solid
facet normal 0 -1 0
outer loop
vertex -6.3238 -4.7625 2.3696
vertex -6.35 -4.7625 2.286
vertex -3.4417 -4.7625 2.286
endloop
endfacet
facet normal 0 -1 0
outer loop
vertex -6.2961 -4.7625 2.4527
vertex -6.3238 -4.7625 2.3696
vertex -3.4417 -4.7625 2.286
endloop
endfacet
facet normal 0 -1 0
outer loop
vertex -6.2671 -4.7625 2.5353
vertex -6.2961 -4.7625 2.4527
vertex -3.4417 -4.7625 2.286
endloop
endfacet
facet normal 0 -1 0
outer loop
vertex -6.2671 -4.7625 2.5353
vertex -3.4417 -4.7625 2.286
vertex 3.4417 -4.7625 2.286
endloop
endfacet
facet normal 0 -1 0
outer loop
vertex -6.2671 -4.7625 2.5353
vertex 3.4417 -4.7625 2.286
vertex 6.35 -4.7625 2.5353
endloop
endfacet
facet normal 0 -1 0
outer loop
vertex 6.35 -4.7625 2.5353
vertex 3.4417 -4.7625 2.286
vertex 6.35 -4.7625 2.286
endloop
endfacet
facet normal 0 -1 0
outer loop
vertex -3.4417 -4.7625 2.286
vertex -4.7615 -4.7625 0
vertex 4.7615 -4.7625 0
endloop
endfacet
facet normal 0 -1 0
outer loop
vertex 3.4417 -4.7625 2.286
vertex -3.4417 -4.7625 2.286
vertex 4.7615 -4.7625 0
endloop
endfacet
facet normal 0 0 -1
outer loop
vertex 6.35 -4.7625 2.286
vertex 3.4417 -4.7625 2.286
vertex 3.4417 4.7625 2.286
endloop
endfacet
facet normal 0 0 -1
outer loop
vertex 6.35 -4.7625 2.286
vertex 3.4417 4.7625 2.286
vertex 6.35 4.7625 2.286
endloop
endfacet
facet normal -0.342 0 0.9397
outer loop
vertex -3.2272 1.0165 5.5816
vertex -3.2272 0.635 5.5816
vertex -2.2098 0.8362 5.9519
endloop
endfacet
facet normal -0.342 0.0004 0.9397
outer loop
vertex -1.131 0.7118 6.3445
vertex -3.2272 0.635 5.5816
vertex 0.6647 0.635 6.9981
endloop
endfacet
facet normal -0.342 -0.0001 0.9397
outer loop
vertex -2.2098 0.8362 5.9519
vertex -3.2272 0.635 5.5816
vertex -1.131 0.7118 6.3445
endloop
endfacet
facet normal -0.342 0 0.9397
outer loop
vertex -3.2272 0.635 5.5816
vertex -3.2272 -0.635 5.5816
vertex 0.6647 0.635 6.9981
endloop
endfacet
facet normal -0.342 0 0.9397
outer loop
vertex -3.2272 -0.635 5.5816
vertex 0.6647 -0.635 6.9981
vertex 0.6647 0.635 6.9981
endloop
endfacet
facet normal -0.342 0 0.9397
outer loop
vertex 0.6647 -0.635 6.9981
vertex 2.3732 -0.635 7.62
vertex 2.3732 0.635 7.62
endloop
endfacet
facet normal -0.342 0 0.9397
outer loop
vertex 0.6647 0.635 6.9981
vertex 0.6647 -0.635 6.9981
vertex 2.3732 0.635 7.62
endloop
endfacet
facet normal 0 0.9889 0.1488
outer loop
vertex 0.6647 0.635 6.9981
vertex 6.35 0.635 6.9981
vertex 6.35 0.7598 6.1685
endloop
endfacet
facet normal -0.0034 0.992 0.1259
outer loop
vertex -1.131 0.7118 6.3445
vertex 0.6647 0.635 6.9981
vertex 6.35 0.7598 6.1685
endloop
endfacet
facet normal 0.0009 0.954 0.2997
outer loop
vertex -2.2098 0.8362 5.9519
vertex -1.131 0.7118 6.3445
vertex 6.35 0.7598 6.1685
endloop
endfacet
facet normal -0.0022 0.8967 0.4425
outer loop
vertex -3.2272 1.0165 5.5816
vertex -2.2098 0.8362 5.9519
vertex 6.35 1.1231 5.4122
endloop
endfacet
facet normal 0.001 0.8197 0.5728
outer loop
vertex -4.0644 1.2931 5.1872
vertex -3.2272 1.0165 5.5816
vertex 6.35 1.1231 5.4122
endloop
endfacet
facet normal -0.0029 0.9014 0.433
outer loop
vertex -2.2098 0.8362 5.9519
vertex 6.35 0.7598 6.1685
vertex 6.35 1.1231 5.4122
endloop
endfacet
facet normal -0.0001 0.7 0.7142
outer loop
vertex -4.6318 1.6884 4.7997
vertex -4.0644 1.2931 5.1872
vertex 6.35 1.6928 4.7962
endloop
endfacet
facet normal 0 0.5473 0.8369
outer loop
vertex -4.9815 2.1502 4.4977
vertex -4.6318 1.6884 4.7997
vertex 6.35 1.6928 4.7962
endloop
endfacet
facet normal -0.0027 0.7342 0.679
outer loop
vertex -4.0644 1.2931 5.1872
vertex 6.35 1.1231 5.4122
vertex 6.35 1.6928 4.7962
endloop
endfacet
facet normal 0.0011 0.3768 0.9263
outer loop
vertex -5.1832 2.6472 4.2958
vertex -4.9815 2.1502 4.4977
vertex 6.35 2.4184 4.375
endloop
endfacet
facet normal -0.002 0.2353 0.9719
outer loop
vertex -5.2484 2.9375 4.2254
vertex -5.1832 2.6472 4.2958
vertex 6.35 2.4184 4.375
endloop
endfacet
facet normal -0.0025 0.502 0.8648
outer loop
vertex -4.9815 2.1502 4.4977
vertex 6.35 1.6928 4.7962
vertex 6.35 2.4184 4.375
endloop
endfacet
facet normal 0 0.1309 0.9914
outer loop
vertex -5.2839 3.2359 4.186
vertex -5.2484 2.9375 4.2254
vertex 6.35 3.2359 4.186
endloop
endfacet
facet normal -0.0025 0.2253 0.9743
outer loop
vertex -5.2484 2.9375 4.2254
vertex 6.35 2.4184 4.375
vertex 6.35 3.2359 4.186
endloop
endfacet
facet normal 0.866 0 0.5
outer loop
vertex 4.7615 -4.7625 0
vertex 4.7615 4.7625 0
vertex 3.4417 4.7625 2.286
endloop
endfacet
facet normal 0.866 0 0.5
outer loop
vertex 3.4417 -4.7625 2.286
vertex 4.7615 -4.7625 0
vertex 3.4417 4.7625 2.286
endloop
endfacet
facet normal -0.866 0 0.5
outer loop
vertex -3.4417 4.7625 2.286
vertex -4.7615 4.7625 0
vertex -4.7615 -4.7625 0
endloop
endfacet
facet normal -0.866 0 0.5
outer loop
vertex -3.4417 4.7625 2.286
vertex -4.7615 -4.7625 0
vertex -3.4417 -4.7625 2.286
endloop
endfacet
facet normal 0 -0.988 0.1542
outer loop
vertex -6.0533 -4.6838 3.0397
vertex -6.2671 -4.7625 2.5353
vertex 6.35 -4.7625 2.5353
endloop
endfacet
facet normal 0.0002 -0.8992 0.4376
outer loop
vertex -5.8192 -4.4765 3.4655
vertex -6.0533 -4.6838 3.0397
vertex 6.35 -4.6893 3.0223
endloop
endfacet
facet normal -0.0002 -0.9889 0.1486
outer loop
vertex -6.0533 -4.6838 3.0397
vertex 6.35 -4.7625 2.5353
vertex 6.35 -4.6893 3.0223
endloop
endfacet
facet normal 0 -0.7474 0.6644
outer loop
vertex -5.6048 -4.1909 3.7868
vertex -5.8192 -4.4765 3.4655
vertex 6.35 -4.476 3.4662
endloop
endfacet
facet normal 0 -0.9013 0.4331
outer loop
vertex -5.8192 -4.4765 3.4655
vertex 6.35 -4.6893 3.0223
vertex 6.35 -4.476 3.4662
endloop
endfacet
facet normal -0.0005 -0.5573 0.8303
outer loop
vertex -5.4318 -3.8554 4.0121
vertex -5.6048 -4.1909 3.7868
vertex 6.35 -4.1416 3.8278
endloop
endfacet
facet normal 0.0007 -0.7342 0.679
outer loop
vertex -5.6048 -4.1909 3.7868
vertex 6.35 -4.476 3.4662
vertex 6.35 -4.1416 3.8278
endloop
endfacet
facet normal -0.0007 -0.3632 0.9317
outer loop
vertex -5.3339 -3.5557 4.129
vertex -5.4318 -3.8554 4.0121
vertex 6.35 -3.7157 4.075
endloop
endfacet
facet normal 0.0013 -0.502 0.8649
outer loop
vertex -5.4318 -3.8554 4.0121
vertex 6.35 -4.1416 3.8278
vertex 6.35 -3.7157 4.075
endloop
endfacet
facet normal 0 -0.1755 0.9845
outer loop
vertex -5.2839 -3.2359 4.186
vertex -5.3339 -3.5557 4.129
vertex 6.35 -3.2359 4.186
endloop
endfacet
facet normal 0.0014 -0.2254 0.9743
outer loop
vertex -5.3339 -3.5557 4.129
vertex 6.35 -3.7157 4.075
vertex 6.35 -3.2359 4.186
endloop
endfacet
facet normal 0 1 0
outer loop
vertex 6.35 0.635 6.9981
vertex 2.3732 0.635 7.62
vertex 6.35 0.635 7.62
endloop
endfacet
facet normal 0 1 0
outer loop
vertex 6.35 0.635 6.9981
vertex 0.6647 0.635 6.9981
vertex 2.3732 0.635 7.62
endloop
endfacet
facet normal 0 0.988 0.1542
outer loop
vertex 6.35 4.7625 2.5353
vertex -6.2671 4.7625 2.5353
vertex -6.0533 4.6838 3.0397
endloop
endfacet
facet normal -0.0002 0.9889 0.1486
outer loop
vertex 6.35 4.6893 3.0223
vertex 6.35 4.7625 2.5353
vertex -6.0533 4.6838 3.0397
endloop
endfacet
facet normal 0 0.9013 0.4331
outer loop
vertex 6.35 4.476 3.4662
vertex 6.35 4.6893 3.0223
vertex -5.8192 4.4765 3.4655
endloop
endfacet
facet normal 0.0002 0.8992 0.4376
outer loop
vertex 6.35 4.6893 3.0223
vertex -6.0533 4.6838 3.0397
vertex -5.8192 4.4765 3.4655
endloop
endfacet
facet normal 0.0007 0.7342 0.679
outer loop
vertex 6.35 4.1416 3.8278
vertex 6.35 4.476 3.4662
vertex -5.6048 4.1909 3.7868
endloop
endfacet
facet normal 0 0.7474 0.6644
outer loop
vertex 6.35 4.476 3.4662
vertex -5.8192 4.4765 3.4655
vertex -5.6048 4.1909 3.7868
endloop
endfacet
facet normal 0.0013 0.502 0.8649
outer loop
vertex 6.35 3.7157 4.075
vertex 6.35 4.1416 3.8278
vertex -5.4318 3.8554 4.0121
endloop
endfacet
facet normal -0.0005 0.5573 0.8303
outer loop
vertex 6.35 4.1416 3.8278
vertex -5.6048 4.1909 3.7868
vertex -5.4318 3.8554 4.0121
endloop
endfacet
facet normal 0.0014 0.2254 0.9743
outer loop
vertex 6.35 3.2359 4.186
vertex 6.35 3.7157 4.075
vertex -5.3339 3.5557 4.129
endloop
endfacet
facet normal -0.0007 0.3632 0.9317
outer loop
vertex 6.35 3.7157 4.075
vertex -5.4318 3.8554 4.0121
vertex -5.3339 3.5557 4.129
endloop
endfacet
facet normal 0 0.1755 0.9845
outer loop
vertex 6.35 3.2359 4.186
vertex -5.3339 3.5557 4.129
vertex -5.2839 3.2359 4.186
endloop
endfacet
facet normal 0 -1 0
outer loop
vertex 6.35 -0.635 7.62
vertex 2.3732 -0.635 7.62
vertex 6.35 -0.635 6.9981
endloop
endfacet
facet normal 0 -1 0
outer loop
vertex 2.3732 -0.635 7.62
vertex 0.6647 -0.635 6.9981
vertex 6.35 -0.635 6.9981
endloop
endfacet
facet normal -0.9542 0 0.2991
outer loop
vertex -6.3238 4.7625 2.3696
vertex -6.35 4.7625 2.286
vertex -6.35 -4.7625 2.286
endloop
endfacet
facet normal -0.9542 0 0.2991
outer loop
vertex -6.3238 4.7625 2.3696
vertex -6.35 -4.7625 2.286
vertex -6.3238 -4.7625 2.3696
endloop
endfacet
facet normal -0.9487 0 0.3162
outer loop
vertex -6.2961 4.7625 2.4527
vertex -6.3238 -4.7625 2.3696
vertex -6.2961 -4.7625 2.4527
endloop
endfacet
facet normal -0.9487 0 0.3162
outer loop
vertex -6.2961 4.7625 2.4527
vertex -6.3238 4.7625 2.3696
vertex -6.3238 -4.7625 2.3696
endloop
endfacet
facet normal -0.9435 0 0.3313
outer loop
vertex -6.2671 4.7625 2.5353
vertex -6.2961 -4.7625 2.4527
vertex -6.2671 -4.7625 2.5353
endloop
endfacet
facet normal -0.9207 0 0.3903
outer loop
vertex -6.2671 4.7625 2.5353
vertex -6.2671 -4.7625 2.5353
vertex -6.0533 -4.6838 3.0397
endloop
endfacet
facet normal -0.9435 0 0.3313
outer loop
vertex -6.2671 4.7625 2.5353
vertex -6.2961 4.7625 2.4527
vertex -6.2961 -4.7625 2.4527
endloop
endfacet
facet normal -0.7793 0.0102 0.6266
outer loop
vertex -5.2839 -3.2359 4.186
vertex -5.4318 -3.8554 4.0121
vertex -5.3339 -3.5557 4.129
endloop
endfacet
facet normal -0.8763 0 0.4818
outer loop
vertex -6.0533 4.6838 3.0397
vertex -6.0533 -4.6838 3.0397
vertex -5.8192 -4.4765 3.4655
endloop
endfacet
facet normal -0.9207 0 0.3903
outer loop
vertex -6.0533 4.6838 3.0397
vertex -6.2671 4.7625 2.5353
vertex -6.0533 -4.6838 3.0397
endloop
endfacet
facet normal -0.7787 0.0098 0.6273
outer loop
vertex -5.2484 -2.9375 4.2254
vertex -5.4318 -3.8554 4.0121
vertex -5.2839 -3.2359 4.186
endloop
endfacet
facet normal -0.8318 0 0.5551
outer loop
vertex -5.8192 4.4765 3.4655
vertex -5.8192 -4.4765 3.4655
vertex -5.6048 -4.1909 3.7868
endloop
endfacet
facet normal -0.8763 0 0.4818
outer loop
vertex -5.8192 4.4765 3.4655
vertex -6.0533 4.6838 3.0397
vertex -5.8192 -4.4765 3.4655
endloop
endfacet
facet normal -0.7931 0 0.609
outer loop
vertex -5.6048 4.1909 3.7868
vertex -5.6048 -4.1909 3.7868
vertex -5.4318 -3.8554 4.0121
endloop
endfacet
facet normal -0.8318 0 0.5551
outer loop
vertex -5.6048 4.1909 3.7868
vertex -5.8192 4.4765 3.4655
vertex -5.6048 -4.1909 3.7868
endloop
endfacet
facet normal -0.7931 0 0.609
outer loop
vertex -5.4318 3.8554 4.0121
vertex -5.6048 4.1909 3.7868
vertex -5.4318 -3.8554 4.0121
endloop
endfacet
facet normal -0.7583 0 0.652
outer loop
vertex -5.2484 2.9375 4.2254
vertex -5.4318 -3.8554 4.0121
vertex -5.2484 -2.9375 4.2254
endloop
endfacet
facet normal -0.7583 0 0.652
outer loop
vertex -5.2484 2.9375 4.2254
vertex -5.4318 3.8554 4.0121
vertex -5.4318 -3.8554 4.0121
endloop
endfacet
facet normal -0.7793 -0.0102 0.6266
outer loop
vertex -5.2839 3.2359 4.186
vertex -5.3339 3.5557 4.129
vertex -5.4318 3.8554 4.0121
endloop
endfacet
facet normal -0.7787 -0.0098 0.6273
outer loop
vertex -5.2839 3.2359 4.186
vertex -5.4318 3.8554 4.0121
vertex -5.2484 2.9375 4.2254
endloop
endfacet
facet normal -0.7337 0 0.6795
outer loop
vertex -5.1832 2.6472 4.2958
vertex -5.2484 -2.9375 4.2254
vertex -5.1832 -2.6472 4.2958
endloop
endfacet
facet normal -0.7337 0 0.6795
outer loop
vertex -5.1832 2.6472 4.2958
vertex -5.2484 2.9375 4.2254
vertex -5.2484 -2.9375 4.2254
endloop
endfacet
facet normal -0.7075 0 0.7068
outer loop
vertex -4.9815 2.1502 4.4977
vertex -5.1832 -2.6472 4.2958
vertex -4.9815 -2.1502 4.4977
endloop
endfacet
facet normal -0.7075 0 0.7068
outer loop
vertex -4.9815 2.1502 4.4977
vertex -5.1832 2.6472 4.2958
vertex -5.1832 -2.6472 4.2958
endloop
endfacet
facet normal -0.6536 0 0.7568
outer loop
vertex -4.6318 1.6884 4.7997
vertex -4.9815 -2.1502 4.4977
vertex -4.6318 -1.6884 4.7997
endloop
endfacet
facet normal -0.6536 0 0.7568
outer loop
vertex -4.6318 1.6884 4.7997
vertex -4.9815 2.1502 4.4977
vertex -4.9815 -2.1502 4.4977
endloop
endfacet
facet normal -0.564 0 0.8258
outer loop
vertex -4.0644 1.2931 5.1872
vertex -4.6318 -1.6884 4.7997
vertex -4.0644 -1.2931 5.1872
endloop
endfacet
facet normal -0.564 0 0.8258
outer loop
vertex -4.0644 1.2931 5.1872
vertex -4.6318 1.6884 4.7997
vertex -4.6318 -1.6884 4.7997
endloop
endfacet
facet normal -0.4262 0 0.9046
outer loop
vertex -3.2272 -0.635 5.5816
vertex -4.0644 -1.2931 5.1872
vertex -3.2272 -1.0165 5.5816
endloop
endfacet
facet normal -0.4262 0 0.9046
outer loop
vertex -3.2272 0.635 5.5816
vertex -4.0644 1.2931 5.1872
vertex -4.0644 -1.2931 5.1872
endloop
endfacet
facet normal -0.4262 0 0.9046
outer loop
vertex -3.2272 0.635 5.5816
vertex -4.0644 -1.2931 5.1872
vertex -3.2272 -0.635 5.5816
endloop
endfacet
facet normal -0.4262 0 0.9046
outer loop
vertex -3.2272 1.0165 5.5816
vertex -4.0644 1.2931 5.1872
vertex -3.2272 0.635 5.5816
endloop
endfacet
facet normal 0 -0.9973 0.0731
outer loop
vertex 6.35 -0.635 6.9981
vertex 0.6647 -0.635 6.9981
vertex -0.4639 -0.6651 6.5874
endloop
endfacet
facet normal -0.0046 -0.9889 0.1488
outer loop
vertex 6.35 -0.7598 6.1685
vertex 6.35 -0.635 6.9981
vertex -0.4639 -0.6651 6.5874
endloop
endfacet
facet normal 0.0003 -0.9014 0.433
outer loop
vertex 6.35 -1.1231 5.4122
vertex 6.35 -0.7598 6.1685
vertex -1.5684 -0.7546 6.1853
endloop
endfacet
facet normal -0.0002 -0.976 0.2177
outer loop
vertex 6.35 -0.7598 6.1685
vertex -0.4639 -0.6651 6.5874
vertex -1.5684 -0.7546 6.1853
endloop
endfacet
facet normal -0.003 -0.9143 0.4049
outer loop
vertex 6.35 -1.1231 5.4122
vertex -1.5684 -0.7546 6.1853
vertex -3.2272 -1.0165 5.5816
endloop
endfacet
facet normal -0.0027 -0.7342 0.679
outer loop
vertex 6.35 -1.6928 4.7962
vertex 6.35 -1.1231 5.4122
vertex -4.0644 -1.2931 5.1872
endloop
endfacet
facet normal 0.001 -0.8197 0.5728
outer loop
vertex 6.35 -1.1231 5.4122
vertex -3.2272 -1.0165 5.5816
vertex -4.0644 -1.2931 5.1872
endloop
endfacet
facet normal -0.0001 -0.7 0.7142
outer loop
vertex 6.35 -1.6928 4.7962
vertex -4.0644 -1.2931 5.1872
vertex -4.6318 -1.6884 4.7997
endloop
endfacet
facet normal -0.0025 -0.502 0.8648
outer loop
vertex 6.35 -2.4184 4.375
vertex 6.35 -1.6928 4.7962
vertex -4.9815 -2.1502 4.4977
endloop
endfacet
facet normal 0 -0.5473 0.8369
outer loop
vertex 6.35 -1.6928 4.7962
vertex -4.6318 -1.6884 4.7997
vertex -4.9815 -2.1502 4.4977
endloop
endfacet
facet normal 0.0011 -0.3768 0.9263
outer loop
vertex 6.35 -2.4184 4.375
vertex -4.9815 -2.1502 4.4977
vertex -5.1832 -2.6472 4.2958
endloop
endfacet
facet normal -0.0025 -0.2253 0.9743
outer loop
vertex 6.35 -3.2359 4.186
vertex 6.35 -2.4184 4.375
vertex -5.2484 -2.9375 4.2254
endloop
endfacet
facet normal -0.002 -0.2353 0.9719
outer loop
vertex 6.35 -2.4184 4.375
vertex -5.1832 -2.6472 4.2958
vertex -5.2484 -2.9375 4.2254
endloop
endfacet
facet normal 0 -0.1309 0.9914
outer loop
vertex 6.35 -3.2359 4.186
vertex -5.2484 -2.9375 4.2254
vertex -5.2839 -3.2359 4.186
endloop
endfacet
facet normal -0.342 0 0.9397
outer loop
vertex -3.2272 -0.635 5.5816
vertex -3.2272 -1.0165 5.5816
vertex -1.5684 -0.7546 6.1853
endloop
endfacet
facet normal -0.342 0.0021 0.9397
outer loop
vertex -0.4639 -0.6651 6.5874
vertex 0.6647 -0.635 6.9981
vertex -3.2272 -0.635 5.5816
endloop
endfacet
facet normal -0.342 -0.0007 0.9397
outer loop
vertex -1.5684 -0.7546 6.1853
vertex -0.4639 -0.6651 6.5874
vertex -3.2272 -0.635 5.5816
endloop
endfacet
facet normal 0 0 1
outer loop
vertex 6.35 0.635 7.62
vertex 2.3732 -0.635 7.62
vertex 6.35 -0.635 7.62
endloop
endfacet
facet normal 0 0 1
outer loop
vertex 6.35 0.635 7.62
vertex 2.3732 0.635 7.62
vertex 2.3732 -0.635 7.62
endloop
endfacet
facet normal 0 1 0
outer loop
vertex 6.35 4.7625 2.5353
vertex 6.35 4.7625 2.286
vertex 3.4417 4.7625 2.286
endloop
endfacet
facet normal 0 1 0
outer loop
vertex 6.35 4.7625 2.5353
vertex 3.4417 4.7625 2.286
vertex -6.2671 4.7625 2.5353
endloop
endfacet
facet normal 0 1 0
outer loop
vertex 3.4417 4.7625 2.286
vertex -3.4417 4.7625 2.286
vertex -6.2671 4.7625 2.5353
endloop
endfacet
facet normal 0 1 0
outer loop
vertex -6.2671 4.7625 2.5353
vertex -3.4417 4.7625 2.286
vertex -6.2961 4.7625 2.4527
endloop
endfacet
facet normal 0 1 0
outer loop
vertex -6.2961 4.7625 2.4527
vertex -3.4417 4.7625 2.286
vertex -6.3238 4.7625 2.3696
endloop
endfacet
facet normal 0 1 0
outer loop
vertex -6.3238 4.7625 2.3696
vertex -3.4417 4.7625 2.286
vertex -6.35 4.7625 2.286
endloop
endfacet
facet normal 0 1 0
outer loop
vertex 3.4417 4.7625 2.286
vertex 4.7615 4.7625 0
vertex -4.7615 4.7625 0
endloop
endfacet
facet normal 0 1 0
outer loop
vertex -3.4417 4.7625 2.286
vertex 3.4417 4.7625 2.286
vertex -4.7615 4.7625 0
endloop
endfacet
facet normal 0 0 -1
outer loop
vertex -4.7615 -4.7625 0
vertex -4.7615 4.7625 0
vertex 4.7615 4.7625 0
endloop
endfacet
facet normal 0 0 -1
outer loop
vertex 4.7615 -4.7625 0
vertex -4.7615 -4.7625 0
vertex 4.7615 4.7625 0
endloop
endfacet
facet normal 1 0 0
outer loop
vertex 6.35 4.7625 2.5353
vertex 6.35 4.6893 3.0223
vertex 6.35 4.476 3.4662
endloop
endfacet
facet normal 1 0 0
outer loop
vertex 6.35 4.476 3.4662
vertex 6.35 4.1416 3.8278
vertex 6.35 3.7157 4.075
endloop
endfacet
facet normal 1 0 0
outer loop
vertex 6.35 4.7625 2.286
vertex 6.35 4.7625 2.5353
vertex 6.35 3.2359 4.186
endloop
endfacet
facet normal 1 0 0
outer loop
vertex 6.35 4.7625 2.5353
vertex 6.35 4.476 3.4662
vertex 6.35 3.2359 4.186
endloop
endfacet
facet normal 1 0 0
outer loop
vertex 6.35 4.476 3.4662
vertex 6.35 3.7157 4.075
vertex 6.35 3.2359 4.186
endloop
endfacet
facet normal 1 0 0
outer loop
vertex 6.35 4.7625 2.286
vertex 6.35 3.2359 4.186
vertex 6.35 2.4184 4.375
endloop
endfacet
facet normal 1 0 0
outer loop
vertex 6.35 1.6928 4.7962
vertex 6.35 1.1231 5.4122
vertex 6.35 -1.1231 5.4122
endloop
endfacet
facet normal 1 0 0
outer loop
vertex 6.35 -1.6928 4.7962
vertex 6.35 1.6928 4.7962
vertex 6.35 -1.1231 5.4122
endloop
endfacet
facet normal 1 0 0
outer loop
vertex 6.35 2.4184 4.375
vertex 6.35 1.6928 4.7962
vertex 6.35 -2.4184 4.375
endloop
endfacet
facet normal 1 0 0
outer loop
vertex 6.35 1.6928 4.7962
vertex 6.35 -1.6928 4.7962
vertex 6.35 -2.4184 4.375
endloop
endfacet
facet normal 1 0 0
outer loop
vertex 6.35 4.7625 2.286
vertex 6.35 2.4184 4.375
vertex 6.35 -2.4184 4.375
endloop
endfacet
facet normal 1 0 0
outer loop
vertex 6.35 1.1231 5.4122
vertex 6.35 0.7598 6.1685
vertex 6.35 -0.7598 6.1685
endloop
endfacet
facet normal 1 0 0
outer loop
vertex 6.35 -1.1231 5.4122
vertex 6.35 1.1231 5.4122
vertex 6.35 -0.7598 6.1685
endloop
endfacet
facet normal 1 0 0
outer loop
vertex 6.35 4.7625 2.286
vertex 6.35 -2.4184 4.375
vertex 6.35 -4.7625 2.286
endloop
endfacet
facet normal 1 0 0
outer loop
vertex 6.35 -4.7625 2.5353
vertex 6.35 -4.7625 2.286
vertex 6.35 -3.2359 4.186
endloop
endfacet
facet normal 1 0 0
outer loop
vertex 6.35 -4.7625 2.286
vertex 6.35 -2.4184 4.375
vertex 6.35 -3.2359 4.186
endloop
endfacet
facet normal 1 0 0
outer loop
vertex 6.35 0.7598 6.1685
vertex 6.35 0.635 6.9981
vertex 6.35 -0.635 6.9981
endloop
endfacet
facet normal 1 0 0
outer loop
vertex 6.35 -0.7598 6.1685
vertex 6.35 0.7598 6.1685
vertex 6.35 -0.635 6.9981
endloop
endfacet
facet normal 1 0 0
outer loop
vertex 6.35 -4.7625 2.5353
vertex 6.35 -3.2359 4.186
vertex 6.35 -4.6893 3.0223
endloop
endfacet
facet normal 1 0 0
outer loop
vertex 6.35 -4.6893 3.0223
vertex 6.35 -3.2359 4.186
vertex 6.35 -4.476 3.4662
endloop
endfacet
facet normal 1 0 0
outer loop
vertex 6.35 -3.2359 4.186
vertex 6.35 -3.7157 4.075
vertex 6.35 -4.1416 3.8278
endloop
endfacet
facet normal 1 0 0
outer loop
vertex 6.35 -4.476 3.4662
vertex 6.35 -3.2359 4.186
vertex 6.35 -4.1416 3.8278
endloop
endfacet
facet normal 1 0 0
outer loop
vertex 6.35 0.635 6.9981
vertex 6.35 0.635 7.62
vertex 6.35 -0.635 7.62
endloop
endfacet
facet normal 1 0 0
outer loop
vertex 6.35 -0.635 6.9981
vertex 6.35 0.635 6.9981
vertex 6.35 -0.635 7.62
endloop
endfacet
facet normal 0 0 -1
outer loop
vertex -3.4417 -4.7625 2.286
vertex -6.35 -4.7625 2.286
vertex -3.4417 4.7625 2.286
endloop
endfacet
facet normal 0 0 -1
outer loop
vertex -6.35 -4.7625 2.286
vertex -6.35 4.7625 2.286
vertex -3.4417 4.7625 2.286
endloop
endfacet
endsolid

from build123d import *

# Parameters (mm, degrees)
F0_W         = 9.525
F0_H         = 9.525
F1_DEPTH     = 2.286
F2_T1_DEPTH  = 21.3619144247
F3_W         = 2.9083
F3_H         = 9.525
F3_W_2       = 6.8834
F4_DEPTH     = 1.905
F5_R         = 1.6556676611
F6_W         = 12.7
F6_H         = 1.27
F7_DEPTH     = 3.429
F8_SIZE2     = 8.7232408068
F8_SIZE      = 3.175
F9_T4_DEPTH  = 12.7
F9_T9_DEPTH  = 12.7
F10_T1_DEPTH = 21.1289299719


# Not quite as in the source:
# - a fillet or chamfer that OpenCascade refuses, or shapes differently, is made with other operations: its cross-section is extruded or revolved along the edge and cut away or added


with BuildPart() as f1:
    # F0 (on Top) → F1 (new body)
    with BuildSketch(Plane.XY):
        Rectangle(F0_W, F0_H)
    extrude(amount=F1_DEPTH)

    # F2: chamfer of 1.3208 x 2.2876927066 on 2 edges, made by hand

    # F2_s2 → F2_t1 (cut)
    with BuildSketch(Plane.XZ.offset(-10.6809572123)):
        Polygon((-4.7625, -0.0016927066), (-3.4417, 2.286), (-4.7625, 2.286), align=None)
        Polygon((4.7625, -0.0016927066), (3.4417, 2.286), (4.7625, 2.286), align=None)
    extrude(amount=F2_T1_DEPTH, mode=Mode.SUBTRACT)

    # F3 (on face) → F4 (join)
    with BuildSketch(Plane.XY.offset(2.286)):
        with Locations((4.89585, 0)):
            Rectangle(F3_W, F3_H)
        Rectangle(F3_W_2, F3_H)
        with Locations((-4.89585, 0)):
            Rectangle(F3_W, F3_H)
    extrude(amount=F4_DEPTH)

    # F5
    f5_edges = [f1.edges().sort_by_distance(p)[0] for p in [
        (0, 4.7625, 4.191),
        (0, -4.7625, 4.191),
    ]]
    fillet(f5_edges, radius=F5_R)

    # F6 (on face) → F7 (join)
    with BuildSketch(Plane.XY.offset(4.191)):
        Rectangle(F6_W, F6_H)
    extrude(amount=F7_DEPTH)

    # F8
    f8_edges = [f1.edges().sort_by_distance(p)[0] for p in [
        (-6.35, 0, 7.62),
    ]]
    f8_side = f1.faces().sort_by_distance((-6.35, 0, 3.751025))[0]
    chamfer(f8_edges, length=F8_SIZE, length2=F8_SIZE2, reference=f8_side)

    # F9: fillet of radius 2.8207671263 on 2 edges, made by hand


with BuildPart() as f9_tool2:
    # F9_s3 → F9_t4 (new body)
    with BuildSketch(Plane.YZ.offset(-6.35)):
        with BuildLine():
            ThreePointArc((-0.635, 6.9981468006), (-1.3849039981, 5.0828783899), (-3.235890411, 4.1859623453))
            Line((-3.235890411, 4.1859623453), (-3.2139027394, 3.9047438998))
            ThreePointArc((-3.2139027394, 3.9047438998), (-3.1068323389, 3.9089232874), (-0.635, 3.9089232874))
            Line((-0.635, 3.9089232874), (-0.3529232874, 4.191))
            Line((-0.3529232874, 4.191), (-0.3529232874, 6.9981468006))
            Line((-0.3529232874, 6.9981468006), (-0.635, 6.9981468006))
        make_face()
    extrude(amount=F9_T4_DEPTH)

    split(bisect_by=Plane(origin=(-2.1714043556, 0, 5.9658844356), x_dir=(0, 1, 0), z_dir=(0.3420201433, 0, -0.9396926208)), keep=Keep.TOP)


with BuildPart() as f1_1:
    add(f1.part)

    # F9_t1: union F9_tool2
    add(f9_tool2.part)


with BuildPart() as f9_tool7:
    # F9_s8 → F9_t9 (new body)
    with BuildSketch(Plane.YZ.offset(6.35)):
        with BuildLine():
            ThreePointArc((0.635, 6.9981468006), (1.3849039981, 5.0828783899), (3.235890411, 4.1859623453))
            Line((3.235890411, 4.1859623453), (3.2139027394, 3.9047438998))
            ThreePointArc((3.2139027394, 3.9047438998), (3.1068323389, 3.9089232874), (0.635, 3.9089232874))
            Line((0.635, 3.9089232874), (0.3529232874, 4.191))
            Line((0.3529232874, 4.191), (0.3529232874, 6.9981468006))
            Line((0.3529232874, 6.9981468006), (0.635, 6.9981468006))
        make_face()
    extrude(amount=-F9_T9_DEPTH)

    split(bisect_by=Plane(origin=(-2.1714043556, 0, 5.9658844356), x_dir=(0, 1, 0), z_dir=(0.3420201433, 0, -0.9396926208)), keep=Keep.TOP)


with BuildPart() as f1_2:
    add(f1_1.part)

    # F9_t6: union F9_tool7
    add(f9_tool7.part)

    # F10: fillet of radius 5.08 on 1 edges, made by hand

    # F10_s2 → F10_t1 (cut)
    with BuildSketch(Plane.XZ.offset(-10.564464986)):
        with BuildLine():
            ThreePointArc((-6.35, 2.286), (-5.1772680397, 4.3020632997), (-3.2272380907, 5.5815923837))
            Line((-3.2272380907, 5.5815923837), (-3.2619873372, 5.677065154))
            Line((-3.2619873372, 5.677065154), (-6.3847492466, 4.5404727703))
            Line((-6.3847492466, 4.5404727703), (-6.4516, 4.445))
            ThreePointArc((-6.4516, 4.445), (-6.4516, 3.3655), (-6.4472044847, 2.3155609226))
            Line((-6.4472044847, 2.3155609226), (-6.35, 2.286))
        make_face()
    extrude(amount=F10_T1_DEPTH, mode=Mode.SUBTRACT)


solid = f1_2.part
